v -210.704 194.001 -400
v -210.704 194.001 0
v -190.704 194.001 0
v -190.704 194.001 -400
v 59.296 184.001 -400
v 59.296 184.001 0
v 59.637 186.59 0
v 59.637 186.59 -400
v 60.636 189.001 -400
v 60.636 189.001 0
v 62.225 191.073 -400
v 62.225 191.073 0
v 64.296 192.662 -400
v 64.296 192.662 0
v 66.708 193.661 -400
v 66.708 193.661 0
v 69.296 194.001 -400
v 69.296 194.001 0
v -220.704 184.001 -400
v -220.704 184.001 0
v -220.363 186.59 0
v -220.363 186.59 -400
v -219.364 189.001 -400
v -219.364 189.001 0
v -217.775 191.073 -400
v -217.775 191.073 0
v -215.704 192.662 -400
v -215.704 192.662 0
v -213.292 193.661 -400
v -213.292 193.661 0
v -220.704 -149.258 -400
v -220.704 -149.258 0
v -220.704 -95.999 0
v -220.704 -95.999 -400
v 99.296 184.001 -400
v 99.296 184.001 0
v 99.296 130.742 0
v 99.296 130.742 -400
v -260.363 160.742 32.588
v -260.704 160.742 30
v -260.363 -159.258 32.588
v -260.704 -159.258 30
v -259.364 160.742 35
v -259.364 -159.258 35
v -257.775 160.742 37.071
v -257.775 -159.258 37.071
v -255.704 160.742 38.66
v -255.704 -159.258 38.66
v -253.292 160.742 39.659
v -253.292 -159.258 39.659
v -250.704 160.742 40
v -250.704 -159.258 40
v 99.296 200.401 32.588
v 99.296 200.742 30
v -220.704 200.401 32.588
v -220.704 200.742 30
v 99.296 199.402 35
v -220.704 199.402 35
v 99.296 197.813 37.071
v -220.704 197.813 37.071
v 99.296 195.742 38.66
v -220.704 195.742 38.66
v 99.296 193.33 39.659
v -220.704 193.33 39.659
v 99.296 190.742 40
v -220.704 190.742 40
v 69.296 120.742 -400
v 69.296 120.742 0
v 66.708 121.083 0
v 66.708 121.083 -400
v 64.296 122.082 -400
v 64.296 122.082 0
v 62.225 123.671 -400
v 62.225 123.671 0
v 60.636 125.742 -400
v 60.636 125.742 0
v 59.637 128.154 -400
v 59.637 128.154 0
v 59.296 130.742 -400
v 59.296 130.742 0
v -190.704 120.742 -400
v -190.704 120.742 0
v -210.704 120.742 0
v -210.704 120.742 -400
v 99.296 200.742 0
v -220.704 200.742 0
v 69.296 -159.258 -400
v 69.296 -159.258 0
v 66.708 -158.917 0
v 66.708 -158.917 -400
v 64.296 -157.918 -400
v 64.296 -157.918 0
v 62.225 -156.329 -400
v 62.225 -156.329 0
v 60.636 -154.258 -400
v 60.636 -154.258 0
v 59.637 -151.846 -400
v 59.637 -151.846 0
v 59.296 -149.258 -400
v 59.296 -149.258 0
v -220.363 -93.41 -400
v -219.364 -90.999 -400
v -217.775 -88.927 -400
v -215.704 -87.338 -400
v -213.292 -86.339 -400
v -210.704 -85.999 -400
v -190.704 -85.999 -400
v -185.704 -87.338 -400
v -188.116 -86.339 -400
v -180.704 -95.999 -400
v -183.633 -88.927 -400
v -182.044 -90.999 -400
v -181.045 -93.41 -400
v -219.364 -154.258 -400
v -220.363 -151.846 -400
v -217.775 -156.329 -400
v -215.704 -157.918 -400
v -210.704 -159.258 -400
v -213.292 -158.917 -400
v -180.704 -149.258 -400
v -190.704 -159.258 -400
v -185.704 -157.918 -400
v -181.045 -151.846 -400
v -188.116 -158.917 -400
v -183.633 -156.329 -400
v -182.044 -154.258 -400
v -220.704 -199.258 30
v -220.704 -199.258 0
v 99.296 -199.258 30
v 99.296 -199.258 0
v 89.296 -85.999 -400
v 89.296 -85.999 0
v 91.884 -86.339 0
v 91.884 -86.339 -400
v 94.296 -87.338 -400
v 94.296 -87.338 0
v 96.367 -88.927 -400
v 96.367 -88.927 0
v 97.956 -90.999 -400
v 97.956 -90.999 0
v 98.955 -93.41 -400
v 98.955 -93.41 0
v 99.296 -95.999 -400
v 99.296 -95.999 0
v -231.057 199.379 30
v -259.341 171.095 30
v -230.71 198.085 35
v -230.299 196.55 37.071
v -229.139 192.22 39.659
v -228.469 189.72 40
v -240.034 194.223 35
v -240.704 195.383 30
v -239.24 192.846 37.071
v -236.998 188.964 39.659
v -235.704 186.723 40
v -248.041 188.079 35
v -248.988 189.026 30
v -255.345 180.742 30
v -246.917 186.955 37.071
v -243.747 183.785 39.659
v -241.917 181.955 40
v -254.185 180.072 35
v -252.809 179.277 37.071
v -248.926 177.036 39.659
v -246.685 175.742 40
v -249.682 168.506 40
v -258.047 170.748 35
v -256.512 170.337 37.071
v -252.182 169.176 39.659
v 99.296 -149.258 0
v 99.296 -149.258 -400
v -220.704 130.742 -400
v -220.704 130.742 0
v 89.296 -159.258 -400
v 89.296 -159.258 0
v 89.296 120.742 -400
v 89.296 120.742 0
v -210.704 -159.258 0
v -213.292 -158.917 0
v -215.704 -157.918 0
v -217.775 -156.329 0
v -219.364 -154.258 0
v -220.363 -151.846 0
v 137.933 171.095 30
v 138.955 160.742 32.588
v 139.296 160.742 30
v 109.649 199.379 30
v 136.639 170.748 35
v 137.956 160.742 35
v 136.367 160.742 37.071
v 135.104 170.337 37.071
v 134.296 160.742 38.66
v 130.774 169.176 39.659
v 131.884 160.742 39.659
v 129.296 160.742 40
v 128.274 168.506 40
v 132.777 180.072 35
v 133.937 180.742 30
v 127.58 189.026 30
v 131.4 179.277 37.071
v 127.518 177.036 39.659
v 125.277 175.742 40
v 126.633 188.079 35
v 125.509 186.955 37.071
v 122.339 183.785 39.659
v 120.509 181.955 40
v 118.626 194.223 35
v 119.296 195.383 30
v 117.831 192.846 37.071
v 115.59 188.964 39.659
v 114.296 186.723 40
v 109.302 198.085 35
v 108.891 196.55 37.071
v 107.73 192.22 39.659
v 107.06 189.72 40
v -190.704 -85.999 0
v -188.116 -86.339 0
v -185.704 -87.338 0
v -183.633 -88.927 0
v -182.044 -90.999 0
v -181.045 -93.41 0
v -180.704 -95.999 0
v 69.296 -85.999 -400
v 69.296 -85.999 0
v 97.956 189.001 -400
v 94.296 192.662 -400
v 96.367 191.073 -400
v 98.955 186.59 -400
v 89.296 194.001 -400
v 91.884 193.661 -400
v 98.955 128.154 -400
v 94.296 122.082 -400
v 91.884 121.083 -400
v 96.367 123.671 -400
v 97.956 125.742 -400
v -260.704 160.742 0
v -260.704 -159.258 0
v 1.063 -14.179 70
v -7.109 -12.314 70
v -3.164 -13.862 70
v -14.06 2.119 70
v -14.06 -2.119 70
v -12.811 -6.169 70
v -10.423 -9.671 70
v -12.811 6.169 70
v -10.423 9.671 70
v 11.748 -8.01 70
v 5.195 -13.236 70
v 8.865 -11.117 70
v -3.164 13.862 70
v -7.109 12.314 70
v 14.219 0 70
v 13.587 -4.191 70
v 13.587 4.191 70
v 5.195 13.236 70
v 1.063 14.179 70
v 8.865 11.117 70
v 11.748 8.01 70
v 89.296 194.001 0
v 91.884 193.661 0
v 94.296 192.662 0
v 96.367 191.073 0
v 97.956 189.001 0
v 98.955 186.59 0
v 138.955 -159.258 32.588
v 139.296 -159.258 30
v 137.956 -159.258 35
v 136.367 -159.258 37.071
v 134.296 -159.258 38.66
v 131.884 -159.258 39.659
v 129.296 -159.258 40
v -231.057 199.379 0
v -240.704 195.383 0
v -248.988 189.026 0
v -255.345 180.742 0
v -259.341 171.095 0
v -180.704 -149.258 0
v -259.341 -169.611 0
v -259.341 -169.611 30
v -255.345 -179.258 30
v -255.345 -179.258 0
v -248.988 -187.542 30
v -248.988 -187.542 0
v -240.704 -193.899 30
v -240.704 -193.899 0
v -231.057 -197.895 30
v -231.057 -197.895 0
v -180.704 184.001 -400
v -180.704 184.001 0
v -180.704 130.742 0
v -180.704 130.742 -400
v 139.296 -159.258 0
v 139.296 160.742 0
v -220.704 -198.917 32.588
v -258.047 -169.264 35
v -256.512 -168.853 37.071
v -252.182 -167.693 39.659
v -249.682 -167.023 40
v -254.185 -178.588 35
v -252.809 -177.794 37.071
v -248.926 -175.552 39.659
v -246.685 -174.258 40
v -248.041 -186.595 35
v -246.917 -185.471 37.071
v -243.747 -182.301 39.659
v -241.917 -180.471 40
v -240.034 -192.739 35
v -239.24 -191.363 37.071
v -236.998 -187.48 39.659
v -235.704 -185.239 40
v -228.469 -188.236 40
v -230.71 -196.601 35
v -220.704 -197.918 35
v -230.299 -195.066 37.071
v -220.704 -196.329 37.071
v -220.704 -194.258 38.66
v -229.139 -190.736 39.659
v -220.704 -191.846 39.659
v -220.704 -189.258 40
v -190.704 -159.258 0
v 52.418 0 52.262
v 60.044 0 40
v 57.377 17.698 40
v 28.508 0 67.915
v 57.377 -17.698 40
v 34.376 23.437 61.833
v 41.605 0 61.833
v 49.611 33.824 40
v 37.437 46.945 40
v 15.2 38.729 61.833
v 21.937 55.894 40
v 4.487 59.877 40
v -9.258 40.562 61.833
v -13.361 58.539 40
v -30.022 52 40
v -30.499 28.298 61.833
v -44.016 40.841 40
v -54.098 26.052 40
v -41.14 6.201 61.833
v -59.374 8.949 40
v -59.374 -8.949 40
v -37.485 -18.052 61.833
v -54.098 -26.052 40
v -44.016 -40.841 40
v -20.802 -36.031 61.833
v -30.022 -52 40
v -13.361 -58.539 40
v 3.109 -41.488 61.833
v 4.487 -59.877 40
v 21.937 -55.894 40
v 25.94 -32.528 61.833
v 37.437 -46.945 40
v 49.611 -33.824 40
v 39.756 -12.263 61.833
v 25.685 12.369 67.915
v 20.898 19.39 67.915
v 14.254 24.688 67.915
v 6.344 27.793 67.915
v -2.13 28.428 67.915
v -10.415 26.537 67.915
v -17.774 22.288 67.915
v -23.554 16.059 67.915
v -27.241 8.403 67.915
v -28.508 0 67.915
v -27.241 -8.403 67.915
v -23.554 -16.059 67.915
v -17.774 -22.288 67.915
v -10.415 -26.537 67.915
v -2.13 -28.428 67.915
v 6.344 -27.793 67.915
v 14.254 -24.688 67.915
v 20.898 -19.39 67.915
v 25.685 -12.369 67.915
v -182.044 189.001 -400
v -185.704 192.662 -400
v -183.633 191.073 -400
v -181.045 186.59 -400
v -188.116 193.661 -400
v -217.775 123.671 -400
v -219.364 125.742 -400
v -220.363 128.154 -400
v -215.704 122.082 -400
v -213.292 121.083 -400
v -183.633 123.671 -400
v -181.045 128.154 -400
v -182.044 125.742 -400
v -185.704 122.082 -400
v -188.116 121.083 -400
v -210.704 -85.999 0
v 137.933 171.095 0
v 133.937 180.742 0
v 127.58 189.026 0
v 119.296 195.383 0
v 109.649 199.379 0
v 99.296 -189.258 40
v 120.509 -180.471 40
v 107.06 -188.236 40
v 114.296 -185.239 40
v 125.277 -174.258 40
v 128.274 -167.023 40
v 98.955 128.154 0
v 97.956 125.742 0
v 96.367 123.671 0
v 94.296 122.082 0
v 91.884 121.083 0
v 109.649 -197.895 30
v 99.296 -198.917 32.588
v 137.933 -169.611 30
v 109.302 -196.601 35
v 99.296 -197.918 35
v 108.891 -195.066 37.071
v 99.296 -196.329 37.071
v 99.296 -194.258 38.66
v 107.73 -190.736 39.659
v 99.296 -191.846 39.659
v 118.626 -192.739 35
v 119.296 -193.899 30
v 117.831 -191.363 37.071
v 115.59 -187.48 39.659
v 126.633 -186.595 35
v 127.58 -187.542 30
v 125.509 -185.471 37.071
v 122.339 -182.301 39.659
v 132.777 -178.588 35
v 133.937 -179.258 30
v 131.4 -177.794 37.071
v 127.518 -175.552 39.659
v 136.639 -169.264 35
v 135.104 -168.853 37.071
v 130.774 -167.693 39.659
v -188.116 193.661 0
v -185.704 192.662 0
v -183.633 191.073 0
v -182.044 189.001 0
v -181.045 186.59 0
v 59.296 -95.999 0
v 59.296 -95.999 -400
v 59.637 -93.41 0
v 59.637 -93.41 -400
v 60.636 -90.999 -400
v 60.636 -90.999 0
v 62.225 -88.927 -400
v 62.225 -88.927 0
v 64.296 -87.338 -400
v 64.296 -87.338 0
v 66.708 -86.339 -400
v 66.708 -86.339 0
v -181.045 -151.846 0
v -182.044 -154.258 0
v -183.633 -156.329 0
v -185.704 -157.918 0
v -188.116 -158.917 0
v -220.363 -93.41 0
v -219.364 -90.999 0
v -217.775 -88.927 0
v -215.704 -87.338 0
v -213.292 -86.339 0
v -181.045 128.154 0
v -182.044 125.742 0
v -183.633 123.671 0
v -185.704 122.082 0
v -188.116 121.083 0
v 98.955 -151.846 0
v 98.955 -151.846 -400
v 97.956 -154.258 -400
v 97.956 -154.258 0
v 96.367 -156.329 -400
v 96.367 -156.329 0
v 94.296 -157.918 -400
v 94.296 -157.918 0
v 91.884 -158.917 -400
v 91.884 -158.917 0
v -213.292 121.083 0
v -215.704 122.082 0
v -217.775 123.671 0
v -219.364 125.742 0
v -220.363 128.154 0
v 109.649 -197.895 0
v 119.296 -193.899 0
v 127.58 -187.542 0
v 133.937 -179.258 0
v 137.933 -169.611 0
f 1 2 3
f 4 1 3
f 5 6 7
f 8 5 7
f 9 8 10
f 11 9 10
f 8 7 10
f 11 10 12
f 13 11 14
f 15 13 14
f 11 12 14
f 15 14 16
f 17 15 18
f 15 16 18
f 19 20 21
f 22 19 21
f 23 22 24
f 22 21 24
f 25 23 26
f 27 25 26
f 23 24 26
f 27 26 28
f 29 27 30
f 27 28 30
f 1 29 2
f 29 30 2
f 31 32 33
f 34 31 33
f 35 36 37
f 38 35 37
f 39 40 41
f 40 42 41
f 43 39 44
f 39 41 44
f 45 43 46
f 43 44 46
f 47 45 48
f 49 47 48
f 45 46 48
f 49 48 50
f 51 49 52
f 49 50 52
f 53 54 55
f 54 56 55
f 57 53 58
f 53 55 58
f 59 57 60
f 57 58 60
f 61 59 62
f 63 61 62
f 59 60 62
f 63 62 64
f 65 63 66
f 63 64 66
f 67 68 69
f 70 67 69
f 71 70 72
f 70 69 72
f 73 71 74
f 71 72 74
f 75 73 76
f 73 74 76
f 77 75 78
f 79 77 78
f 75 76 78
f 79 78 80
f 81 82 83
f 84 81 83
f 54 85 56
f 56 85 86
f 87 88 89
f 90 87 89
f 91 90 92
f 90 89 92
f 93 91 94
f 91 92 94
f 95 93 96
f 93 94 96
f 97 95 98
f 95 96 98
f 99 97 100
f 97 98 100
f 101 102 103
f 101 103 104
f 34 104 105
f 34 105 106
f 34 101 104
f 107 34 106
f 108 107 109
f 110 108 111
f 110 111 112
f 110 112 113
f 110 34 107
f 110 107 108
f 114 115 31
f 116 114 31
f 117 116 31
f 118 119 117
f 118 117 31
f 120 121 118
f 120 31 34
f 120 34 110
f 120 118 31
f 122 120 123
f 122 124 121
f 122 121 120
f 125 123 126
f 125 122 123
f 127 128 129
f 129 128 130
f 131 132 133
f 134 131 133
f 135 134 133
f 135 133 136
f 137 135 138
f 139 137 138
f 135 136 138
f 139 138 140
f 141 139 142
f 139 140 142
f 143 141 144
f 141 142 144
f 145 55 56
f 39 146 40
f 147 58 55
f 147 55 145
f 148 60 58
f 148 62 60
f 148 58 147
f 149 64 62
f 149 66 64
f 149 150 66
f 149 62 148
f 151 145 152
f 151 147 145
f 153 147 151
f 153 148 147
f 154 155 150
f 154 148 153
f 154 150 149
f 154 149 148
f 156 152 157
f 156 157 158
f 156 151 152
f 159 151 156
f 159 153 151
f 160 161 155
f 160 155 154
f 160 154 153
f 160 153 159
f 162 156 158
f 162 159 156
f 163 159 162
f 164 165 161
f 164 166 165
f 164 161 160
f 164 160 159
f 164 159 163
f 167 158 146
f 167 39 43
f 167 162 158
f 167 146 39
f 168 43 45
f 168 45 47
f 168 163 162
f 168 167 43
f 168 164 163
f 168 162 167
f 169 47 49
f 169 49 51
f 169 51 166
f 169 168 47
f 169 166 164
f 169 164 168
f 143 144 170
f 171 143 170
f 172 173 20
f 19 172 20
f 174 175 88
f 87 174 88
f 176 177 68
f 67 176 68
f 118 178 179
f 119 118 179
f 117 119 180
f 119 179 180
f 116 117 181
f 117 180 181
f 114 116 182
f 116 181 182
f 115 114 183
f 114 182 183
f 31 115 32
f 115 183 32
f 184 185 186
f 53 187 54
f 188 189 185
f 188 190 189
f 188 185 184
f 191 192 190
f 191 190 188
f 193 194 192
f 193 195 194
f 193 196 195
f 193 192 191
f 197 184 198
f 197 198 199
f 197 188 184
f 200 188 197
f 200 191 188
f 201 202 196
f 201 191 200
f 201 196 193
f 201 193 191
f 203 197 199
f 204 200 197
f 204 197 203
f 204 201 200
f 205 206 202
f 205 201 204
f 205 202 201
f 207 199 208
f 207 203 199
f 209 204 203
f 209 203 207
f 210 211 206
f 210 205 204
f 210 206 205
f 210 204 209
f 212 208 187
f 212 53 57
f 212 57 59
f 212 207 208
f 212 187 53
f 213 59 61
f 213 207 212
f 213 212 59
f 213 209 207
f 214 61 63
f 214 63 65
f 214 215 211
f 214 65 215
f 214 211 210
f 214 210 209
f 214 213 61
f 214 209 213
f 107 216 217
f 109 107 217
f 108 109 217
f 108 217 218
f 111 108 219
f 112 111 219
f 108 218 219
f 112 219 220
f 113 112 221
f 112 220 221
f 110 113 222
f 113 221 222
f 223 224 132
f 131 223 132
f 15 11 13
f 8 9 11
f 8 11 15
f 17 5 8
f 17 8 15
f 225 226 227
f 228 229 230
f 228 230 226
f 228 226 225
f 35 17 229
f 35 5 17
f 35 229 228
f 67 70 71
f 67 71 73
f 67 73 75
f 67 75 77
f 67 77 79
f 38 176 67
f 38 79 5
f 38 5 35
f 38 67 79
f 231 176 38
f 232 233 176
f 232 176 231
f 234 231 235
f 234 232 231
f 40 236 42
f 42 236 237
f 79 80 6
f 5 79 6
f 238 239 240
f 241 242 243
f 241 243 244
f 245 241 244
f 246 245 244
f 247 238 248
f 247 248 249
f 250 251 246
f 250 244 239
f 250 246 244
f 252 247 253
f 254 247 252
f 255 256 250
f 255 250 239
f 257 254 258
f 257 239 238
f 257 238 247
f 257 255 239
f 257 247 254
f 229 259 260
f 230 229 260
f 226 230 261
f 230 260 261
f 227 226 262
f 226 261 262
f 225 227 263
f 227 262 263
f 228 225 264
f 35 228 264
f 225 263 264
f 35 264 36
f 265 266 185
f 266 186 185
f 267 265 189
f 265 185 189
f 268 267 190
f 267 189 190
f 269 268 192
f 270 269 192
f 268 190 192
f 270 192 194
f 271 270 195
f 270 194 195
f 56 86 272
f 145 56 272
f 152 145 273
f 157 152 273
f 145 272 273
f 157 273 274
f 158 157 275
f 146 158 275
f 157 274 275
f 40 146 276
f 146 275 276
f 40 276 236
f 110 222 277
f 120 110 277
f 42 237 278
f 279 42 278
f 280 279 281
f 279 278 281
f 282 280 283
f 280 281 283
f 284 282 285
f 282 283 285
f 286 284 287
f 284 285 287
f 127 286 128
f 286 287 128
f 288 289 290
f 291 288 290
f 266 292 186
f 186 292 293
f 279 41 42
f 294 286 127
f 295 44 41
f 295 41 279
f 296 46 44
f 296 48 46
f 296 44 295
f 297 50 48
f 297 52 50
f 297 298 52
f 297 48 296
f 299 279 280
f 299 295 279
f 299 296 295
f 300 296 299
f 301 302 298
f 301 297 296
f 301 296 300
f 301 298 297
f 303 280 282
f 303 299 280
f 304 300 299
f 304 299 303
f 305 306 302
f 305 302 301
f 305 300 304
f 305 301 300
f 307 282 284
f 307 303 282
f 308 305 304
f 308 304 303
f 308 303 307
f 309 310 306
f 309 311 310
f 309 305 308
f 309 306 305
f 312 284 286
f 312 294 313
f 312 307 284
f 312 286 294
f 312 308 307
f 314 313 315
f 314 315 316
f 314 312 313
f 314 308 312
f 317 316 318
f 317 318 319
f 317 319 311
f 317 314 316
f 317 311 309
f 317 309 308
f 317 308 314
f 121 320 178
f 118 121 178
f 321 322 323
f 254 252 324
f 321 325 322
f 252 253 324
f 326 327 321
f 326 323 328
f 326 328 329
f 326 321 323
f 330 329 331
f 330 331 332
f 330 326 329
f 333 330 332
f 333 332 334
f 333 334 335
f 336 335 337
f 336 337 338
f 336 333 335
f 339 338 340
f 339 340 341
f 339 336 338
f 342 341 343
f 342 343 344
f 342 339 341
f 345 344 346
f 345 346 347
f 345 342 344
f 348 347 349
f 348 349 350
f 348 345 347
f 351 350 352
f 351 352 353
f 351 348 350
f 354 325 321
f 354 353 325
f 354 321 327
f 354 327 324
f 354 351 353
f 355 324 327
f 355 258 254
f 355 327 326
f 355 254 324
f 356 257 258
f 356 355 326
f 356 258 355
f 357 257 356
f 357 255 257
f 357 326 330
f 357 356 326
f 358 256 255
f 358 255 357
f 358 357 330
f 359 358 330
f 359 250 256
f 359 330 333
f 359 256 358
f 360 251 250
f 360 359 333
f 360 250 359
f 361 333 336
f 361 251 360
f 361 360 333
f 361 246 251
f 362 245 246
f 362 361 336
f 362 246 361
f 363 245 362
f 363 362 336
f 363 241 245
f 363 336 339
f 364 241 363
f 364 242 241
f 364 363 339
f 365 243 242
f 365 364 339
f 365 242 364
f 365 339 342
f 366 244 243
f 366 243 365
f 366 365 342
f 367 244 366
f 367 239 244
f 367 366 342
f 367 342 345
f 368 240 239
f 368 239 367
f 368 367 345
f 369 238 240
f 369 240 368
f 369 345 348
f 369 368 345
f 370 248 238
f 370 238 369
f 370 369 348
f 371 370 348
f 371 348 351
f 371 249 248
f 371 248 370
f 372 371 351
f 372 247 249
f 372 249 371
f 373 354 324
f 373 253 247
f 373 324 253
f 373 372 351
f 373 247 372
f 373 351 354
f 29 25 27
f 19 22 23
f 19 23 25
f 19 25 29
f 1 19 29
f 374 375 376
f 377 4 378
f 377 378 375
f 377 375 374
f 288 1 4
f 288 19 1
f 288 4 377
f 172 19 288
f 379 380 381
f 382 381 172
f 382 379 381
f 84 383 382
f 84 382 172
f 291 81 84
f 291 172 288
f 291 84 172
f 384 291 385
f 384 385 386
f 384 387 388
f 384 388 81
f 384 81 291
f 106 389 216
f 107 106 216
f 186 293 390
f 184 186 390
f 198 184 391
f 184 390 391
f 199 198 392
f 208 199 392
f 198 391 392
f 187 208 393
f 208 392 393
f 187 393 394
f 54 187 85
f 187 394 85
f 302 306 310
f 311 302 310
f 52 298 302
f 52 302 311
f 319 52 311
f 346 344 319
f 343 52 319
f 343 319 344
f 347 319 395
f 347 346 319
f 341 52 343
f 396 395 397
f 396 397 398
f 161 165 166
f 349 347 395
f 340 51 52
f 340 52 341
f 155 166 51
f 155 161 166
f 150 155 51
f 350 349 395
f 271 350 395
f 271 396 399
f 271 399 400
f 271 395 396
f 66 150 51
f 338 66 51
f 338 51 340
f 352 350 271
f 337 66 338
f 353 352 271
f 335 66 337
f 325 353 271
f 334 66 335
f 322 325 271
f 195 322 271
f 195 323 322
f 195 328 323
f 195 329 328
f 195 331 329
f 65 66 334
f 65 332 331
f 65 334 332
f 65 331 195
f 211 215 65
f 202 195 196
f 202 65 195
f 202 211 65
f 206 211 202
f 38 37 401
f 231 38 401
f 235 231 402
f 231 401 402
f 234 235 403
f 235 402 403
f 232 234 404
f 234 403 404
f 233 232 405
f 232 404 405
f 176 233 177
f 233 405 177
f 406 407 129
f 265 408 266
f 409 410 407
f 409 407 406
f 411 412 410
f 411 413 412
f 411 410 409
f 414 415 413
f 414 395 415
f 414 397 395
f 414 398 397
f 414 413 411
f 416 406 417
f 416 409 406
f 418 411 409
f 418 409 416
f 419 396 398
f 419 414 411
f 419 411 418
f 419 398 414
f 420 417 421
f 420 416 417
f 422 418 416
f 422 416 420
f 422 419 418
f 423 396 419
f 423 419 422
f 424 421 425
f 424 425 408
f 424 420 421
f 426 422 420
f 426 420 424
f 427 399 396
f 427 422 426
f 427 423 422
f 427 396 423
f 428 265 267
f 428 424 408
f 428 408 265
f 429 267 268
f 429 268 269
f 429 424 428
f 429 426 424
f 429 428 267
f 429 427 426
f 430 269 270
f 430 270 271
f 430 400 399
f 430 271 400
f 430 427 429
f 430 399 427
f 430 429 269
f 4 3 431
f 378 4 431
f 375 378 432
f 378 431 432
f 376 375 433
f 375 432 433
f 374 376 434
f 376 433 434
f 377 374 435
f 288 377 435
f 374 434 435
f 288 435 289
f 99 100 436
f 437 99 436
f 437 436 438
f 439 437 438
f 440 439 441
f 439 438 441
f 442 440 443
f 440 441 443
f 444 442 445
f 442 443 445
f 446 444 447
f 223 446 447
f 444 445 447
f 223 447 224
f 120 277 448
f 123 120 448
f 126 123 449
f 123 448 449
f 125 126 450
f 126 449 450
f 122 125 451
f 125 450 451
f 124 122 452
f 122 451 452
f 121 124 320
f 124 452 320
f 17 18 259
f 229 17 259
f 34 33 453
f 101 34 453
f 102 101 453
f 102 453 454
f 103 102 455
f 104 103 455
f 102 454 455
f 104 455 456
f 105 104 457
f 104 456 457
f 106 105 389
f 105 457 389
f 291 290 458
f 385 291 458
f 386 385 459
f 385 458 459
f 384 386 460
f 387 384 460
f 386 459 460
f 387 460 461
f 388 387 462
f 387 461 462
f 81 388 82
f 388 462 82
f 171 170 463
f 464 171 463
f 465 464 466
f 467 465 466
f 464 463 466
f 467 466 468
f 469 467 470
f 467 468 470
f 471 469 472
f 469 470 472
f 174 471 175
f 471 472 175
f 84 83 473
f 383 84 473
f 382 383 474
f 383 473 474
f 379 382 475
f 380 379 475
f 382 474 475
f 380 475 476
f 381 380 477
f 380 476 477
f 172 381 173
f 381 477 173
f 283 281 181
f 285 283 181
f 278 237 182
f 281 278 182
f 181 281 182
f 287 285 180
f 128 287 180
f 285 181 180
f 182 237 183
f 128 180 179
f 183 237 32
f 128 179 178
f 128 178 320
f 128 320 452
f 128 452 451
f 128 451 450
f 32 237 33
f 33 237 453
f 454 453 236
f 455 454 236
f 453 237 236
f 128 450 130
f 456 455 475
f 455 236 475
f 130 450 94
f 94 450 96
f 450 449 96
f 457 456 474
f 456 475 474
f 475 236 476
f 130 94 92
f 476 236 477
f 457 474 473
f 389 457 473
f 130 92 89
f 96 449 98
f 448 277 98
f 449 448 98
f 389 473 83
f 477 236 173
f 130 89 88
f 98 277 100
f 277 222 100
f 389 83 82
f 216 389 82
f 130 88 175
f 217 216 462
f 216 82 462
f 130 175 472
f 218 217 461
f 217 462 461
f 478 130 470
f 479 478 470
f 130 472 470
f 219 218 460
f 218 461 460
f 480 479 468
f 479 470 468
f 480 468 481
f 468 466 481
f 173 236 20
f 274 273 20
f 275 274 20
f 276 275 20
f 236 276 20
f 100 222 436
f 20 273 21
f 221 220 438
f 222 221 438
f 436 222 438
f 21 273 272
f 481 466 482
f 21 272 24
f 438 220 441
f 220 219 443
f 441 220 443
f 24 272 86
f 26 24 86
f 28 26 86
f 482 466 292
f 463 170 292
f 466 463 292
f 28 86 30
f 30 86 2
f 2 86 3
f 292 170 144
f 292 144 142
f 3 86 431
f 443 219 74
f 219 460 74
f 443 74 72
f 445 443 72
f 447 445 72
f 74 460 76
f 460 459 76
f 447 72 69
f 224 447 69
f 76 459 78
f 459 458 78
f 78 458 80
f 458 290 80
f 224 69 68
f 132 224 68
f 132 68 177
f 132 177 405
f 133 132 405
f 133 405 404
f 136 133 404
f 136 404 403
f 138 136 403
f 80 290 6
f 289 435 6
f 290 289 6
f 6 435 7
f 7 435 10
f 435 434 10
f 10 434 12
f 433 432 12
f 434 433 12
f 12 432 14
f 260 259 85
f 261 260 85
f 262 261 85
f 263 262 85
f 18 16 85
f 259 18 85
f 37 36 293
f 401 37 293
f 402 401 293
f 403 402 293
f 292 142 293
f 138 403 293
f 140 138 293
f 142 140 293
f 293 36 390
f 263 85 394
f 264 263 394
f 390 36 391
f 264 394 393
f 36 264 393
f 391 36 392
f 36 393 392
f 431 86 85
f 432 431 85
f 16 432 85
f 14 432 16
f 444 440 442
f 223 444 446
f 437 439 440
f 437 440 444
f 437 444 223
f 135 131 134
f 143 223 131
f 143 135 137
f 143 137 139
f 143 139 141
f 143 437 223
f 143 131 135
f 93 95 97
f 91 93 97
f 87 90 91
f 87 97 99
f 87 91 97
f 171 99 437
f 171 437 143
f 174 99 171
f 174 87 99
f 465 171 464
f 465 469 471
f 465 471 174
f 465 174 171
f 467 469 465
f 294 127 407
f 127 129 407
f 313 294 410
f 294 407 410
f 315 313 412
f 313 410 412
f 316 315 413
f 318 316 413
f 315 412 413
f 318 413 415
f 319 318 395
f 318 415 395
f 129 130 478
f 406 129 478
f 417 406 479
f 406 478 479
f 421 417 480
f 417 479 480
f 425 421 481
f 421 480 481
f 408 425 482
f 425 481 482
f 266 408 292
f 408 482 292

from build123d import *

# Parameters (mm, degrees)
F1_DEPTH = 40
F2_R     = 10
F4_DEPTH = 400
F5_R     = 60.0444611856
F6_DEPTH = 30


# Not quite as in the source:
# - a fillet or chamfer that OpenCascade refuses, or shapes differently, is made with other operations: its cross-section is extruded or revolved along the edge and cut away or added


with BuildPart() as f1:
    # F0 (on Top) → F1 (new body)
    with BuildSketch(Plane.XY):
        with BuildLine():
            ThreePointArc((-260.7041027397, -159.2581299295), (-248.9883739872, -187.542401177), (-220.7041027397, -199.2581299295))
            Line((-220.7041027397, -199.2581299295), (99.2958972603, -199.2581299295))
            ThreePointArc((99.2958972603, -199.2581299295), (127.5801685078, -187.542401177), (139.2958972603, -159.2581299295))
            Line((139.2958972603, -159.2581299295), (139.2958972603, 160.7418700705))
            ThreePointArc((139.2958972603, 160.7418700705), (127.5801685078, 189.0261413179), (99.2958972603, 200.7418700705))
            Line((99.2958972603, 200.7418700705), (-220.7041027397, 200.7418700705))
            ThreePointArc((-220.7041027397, 200.7418700705), (-248.9883739872, 189.0261413179), (-260.7041027397, 160.7418700705))
            Line((-260.7041027397, 160.7418700705), (-260.7041027397, -159.2581299295))
        make_face()
    extrude(amount=F1_DEPTH)

    # F2
    f2_edges = [f1.edges().sort_by_distance(p)[0] for p in [
        (-260.704103, 0.74187, 40),
        (-248.988374, -187.542401, 40),
        (-60.704103, -199.25813, 40),
        (127.580169, -187.542401, 40),
        (139.295897, 0.74187, 40),
        (127.580169, 189.026141, 40),
        (-60.704103, 200.74187, 40),
        (-248.988374, 189.026141, 40),
    ]]
    fillet(f2_edges, radius=F2_R)

    # F3 (on face) → F4 (join)
    with BuildSketch(Plane(origin=(0, 0, 0), x_dir=(1, 0, 0), z_dir=(0, 0, -1))):
        with BuildLine():
            Line((99.2958972603, -184.0014514797), (99.2958972603, -130.7418700705))
            ThreePointArc((99.2958972603, -130.7418700705), (96.3669650722, -123.6708022586), (89.2958972603, -120.7418700705))
            Line((89.2958972603, -120.7418700705), (69.2958972603, -120.7418700705))
            ThreePointArc((69.2958972603, -120.7418700705), (62.2248294484, -123.6708022586), (59.2958972603, -130.7418700705))
            Line((59.2958972603, -130.7418700705), (59.2958972603, -184.0014514797))
            ThreePointArc((59.2958972603, -184.0014514797), (62.2248294484, -191.0725192915), (69.2958972603, -194.0014514797))
            Line((69.2958972603, -194.0014514797), (89.2958972603, -194.0014514797))
            ThreePointArc((89.2958972603, -194.0014514797), (96.3669650722, -191.0725192915), (99.2958972603, -184.0014514797))
        make_face()
        with BuildLine():
            ThreePointArc((99.2958972603, 149.2581299295), (96.3669650722, 156.3291977414), (89.2958972603, 159.2581299295))
            Line((89.2958972603, 159.2581299295), (69.2958972603, 159.2581299295))
            ThreePointArc((69.2958972603, 159.2581299295), (62.2248294484, 156.3291977414), (59.2958972603, 149.2581299295))
            Line((59.2958972603, 149.2581299295), (59.2958972603, 95.9985485203))
            ThreePointArc((59.2958972603, 95.9985485203), (62.2248294484, 88.9274807085), (69.2958972603, 85.9985485203))
            Line((69.2958972603, 85.9985485203), (89.2958972603, 85.9985485203))
            ThreePointArc((89.2958972603, 85.9985485203), (96.3669650722, 88.9274807085), (99.2958972603, 95.9985485203))
            Line((99.2958972603, 95.9985485203), (99.2958972603, 149.2581299295))
        make_face()
        with BuildLine():
            Line((-180.7041027397, 95.9985485203), (-180.7041027397, 149.2581299295))
            ThreePointArc((-180.7041027397, 149.2581299295), (-183.6330349278, 156.3291977414), (-190.7041027397, 159.2581299295))
            Line((-190.7041027397, 159.2581299295), (-210.7041027397, 159.2581299295))
            ThreePointArc((-210.7041027397, 159.2581299295), (-217.7751705516, 156.3291977414), (-220.7041027397, 149.2581299295))
            Line((-220.7041027397, 149.2581299295), (-220.7041027397, 95.9985485203))
            ThreePointArc((-220.7041027397, 95.9985485203), (-217.7751705516, 88.9274807085), (-210.7041027397, 85.9985485203))
            Line((-210.7041027397, 85.9985485203), (-190.7041027397, 85.9985485203))
            ThreePointArc((-190.7041027397, 85.9985485203), (-183.6330349278, 88.9274807085), (-180.7041027397, 95.9985485203))
        make_face()
        with BuildLine():
            Line((-180.7041027397, -184.0014514797), (-180.7041027397, -130.7418700705))
            ThreePointArc((-180.7041027397, -130.7418700705), (-183.6330349278, -123.6708022586), (-190.7041027397, -120.7418700705))
            Line((-190.7041027397, -120.7418700705), (-210.7041027397, -120.7418700705))
            ThreePointArc((-210.7041027397, -120.7418700705), (-217.7751705516, -123.6708022586), (-220.7041027397, -130.7418700705))
            Line((-220.7041027397, -130.7418700705), (-220.7041027397, -184.0014514797))
            ThreePointArc((-220.7041027397, -184.0014514797), (-217.7751705516, -191.0725192915), (-210.7041027397, -194.0014514797))
            Line((-210.7041027397, -194.0014514797), (-190.7041027397, -194.0014514797))
            ThreePointArc((-190.7041027397, -194.0014514797), (-183.6330349278, -191.0725192915), (-180.7041027397, -184.0014514797))
        make_face()
    extrude(amount=F4_DEPTH)

    # F5 (on face) → F6 (join)
    with BuildSketch(Plane.XY.offset(40)):
        Circle(F5_R)
    extrude(amount=F6_DEPTH)

    # F7: fillet of radius 50 on 1 edges, made by hand

    # F7_s1 → F7_t2 (revolve, cut)
    with BuildSketch(Plane.XZ):
        with BuildLine():
            ThreePointArc((60.0444611856, 40), (41.6048321113, 61.8330013267), (14.218704236, 70))
            Line((14.218704236, 70), (60.0444611856, 70))
            Line((60.0444611856, 70), (60.0444611856, 40))
        make_face()
    revolve(axis=Axis((0, 0, 70), (0, 0, 1)), mode=Mode.SUBTRACT)


solid = f1.part
